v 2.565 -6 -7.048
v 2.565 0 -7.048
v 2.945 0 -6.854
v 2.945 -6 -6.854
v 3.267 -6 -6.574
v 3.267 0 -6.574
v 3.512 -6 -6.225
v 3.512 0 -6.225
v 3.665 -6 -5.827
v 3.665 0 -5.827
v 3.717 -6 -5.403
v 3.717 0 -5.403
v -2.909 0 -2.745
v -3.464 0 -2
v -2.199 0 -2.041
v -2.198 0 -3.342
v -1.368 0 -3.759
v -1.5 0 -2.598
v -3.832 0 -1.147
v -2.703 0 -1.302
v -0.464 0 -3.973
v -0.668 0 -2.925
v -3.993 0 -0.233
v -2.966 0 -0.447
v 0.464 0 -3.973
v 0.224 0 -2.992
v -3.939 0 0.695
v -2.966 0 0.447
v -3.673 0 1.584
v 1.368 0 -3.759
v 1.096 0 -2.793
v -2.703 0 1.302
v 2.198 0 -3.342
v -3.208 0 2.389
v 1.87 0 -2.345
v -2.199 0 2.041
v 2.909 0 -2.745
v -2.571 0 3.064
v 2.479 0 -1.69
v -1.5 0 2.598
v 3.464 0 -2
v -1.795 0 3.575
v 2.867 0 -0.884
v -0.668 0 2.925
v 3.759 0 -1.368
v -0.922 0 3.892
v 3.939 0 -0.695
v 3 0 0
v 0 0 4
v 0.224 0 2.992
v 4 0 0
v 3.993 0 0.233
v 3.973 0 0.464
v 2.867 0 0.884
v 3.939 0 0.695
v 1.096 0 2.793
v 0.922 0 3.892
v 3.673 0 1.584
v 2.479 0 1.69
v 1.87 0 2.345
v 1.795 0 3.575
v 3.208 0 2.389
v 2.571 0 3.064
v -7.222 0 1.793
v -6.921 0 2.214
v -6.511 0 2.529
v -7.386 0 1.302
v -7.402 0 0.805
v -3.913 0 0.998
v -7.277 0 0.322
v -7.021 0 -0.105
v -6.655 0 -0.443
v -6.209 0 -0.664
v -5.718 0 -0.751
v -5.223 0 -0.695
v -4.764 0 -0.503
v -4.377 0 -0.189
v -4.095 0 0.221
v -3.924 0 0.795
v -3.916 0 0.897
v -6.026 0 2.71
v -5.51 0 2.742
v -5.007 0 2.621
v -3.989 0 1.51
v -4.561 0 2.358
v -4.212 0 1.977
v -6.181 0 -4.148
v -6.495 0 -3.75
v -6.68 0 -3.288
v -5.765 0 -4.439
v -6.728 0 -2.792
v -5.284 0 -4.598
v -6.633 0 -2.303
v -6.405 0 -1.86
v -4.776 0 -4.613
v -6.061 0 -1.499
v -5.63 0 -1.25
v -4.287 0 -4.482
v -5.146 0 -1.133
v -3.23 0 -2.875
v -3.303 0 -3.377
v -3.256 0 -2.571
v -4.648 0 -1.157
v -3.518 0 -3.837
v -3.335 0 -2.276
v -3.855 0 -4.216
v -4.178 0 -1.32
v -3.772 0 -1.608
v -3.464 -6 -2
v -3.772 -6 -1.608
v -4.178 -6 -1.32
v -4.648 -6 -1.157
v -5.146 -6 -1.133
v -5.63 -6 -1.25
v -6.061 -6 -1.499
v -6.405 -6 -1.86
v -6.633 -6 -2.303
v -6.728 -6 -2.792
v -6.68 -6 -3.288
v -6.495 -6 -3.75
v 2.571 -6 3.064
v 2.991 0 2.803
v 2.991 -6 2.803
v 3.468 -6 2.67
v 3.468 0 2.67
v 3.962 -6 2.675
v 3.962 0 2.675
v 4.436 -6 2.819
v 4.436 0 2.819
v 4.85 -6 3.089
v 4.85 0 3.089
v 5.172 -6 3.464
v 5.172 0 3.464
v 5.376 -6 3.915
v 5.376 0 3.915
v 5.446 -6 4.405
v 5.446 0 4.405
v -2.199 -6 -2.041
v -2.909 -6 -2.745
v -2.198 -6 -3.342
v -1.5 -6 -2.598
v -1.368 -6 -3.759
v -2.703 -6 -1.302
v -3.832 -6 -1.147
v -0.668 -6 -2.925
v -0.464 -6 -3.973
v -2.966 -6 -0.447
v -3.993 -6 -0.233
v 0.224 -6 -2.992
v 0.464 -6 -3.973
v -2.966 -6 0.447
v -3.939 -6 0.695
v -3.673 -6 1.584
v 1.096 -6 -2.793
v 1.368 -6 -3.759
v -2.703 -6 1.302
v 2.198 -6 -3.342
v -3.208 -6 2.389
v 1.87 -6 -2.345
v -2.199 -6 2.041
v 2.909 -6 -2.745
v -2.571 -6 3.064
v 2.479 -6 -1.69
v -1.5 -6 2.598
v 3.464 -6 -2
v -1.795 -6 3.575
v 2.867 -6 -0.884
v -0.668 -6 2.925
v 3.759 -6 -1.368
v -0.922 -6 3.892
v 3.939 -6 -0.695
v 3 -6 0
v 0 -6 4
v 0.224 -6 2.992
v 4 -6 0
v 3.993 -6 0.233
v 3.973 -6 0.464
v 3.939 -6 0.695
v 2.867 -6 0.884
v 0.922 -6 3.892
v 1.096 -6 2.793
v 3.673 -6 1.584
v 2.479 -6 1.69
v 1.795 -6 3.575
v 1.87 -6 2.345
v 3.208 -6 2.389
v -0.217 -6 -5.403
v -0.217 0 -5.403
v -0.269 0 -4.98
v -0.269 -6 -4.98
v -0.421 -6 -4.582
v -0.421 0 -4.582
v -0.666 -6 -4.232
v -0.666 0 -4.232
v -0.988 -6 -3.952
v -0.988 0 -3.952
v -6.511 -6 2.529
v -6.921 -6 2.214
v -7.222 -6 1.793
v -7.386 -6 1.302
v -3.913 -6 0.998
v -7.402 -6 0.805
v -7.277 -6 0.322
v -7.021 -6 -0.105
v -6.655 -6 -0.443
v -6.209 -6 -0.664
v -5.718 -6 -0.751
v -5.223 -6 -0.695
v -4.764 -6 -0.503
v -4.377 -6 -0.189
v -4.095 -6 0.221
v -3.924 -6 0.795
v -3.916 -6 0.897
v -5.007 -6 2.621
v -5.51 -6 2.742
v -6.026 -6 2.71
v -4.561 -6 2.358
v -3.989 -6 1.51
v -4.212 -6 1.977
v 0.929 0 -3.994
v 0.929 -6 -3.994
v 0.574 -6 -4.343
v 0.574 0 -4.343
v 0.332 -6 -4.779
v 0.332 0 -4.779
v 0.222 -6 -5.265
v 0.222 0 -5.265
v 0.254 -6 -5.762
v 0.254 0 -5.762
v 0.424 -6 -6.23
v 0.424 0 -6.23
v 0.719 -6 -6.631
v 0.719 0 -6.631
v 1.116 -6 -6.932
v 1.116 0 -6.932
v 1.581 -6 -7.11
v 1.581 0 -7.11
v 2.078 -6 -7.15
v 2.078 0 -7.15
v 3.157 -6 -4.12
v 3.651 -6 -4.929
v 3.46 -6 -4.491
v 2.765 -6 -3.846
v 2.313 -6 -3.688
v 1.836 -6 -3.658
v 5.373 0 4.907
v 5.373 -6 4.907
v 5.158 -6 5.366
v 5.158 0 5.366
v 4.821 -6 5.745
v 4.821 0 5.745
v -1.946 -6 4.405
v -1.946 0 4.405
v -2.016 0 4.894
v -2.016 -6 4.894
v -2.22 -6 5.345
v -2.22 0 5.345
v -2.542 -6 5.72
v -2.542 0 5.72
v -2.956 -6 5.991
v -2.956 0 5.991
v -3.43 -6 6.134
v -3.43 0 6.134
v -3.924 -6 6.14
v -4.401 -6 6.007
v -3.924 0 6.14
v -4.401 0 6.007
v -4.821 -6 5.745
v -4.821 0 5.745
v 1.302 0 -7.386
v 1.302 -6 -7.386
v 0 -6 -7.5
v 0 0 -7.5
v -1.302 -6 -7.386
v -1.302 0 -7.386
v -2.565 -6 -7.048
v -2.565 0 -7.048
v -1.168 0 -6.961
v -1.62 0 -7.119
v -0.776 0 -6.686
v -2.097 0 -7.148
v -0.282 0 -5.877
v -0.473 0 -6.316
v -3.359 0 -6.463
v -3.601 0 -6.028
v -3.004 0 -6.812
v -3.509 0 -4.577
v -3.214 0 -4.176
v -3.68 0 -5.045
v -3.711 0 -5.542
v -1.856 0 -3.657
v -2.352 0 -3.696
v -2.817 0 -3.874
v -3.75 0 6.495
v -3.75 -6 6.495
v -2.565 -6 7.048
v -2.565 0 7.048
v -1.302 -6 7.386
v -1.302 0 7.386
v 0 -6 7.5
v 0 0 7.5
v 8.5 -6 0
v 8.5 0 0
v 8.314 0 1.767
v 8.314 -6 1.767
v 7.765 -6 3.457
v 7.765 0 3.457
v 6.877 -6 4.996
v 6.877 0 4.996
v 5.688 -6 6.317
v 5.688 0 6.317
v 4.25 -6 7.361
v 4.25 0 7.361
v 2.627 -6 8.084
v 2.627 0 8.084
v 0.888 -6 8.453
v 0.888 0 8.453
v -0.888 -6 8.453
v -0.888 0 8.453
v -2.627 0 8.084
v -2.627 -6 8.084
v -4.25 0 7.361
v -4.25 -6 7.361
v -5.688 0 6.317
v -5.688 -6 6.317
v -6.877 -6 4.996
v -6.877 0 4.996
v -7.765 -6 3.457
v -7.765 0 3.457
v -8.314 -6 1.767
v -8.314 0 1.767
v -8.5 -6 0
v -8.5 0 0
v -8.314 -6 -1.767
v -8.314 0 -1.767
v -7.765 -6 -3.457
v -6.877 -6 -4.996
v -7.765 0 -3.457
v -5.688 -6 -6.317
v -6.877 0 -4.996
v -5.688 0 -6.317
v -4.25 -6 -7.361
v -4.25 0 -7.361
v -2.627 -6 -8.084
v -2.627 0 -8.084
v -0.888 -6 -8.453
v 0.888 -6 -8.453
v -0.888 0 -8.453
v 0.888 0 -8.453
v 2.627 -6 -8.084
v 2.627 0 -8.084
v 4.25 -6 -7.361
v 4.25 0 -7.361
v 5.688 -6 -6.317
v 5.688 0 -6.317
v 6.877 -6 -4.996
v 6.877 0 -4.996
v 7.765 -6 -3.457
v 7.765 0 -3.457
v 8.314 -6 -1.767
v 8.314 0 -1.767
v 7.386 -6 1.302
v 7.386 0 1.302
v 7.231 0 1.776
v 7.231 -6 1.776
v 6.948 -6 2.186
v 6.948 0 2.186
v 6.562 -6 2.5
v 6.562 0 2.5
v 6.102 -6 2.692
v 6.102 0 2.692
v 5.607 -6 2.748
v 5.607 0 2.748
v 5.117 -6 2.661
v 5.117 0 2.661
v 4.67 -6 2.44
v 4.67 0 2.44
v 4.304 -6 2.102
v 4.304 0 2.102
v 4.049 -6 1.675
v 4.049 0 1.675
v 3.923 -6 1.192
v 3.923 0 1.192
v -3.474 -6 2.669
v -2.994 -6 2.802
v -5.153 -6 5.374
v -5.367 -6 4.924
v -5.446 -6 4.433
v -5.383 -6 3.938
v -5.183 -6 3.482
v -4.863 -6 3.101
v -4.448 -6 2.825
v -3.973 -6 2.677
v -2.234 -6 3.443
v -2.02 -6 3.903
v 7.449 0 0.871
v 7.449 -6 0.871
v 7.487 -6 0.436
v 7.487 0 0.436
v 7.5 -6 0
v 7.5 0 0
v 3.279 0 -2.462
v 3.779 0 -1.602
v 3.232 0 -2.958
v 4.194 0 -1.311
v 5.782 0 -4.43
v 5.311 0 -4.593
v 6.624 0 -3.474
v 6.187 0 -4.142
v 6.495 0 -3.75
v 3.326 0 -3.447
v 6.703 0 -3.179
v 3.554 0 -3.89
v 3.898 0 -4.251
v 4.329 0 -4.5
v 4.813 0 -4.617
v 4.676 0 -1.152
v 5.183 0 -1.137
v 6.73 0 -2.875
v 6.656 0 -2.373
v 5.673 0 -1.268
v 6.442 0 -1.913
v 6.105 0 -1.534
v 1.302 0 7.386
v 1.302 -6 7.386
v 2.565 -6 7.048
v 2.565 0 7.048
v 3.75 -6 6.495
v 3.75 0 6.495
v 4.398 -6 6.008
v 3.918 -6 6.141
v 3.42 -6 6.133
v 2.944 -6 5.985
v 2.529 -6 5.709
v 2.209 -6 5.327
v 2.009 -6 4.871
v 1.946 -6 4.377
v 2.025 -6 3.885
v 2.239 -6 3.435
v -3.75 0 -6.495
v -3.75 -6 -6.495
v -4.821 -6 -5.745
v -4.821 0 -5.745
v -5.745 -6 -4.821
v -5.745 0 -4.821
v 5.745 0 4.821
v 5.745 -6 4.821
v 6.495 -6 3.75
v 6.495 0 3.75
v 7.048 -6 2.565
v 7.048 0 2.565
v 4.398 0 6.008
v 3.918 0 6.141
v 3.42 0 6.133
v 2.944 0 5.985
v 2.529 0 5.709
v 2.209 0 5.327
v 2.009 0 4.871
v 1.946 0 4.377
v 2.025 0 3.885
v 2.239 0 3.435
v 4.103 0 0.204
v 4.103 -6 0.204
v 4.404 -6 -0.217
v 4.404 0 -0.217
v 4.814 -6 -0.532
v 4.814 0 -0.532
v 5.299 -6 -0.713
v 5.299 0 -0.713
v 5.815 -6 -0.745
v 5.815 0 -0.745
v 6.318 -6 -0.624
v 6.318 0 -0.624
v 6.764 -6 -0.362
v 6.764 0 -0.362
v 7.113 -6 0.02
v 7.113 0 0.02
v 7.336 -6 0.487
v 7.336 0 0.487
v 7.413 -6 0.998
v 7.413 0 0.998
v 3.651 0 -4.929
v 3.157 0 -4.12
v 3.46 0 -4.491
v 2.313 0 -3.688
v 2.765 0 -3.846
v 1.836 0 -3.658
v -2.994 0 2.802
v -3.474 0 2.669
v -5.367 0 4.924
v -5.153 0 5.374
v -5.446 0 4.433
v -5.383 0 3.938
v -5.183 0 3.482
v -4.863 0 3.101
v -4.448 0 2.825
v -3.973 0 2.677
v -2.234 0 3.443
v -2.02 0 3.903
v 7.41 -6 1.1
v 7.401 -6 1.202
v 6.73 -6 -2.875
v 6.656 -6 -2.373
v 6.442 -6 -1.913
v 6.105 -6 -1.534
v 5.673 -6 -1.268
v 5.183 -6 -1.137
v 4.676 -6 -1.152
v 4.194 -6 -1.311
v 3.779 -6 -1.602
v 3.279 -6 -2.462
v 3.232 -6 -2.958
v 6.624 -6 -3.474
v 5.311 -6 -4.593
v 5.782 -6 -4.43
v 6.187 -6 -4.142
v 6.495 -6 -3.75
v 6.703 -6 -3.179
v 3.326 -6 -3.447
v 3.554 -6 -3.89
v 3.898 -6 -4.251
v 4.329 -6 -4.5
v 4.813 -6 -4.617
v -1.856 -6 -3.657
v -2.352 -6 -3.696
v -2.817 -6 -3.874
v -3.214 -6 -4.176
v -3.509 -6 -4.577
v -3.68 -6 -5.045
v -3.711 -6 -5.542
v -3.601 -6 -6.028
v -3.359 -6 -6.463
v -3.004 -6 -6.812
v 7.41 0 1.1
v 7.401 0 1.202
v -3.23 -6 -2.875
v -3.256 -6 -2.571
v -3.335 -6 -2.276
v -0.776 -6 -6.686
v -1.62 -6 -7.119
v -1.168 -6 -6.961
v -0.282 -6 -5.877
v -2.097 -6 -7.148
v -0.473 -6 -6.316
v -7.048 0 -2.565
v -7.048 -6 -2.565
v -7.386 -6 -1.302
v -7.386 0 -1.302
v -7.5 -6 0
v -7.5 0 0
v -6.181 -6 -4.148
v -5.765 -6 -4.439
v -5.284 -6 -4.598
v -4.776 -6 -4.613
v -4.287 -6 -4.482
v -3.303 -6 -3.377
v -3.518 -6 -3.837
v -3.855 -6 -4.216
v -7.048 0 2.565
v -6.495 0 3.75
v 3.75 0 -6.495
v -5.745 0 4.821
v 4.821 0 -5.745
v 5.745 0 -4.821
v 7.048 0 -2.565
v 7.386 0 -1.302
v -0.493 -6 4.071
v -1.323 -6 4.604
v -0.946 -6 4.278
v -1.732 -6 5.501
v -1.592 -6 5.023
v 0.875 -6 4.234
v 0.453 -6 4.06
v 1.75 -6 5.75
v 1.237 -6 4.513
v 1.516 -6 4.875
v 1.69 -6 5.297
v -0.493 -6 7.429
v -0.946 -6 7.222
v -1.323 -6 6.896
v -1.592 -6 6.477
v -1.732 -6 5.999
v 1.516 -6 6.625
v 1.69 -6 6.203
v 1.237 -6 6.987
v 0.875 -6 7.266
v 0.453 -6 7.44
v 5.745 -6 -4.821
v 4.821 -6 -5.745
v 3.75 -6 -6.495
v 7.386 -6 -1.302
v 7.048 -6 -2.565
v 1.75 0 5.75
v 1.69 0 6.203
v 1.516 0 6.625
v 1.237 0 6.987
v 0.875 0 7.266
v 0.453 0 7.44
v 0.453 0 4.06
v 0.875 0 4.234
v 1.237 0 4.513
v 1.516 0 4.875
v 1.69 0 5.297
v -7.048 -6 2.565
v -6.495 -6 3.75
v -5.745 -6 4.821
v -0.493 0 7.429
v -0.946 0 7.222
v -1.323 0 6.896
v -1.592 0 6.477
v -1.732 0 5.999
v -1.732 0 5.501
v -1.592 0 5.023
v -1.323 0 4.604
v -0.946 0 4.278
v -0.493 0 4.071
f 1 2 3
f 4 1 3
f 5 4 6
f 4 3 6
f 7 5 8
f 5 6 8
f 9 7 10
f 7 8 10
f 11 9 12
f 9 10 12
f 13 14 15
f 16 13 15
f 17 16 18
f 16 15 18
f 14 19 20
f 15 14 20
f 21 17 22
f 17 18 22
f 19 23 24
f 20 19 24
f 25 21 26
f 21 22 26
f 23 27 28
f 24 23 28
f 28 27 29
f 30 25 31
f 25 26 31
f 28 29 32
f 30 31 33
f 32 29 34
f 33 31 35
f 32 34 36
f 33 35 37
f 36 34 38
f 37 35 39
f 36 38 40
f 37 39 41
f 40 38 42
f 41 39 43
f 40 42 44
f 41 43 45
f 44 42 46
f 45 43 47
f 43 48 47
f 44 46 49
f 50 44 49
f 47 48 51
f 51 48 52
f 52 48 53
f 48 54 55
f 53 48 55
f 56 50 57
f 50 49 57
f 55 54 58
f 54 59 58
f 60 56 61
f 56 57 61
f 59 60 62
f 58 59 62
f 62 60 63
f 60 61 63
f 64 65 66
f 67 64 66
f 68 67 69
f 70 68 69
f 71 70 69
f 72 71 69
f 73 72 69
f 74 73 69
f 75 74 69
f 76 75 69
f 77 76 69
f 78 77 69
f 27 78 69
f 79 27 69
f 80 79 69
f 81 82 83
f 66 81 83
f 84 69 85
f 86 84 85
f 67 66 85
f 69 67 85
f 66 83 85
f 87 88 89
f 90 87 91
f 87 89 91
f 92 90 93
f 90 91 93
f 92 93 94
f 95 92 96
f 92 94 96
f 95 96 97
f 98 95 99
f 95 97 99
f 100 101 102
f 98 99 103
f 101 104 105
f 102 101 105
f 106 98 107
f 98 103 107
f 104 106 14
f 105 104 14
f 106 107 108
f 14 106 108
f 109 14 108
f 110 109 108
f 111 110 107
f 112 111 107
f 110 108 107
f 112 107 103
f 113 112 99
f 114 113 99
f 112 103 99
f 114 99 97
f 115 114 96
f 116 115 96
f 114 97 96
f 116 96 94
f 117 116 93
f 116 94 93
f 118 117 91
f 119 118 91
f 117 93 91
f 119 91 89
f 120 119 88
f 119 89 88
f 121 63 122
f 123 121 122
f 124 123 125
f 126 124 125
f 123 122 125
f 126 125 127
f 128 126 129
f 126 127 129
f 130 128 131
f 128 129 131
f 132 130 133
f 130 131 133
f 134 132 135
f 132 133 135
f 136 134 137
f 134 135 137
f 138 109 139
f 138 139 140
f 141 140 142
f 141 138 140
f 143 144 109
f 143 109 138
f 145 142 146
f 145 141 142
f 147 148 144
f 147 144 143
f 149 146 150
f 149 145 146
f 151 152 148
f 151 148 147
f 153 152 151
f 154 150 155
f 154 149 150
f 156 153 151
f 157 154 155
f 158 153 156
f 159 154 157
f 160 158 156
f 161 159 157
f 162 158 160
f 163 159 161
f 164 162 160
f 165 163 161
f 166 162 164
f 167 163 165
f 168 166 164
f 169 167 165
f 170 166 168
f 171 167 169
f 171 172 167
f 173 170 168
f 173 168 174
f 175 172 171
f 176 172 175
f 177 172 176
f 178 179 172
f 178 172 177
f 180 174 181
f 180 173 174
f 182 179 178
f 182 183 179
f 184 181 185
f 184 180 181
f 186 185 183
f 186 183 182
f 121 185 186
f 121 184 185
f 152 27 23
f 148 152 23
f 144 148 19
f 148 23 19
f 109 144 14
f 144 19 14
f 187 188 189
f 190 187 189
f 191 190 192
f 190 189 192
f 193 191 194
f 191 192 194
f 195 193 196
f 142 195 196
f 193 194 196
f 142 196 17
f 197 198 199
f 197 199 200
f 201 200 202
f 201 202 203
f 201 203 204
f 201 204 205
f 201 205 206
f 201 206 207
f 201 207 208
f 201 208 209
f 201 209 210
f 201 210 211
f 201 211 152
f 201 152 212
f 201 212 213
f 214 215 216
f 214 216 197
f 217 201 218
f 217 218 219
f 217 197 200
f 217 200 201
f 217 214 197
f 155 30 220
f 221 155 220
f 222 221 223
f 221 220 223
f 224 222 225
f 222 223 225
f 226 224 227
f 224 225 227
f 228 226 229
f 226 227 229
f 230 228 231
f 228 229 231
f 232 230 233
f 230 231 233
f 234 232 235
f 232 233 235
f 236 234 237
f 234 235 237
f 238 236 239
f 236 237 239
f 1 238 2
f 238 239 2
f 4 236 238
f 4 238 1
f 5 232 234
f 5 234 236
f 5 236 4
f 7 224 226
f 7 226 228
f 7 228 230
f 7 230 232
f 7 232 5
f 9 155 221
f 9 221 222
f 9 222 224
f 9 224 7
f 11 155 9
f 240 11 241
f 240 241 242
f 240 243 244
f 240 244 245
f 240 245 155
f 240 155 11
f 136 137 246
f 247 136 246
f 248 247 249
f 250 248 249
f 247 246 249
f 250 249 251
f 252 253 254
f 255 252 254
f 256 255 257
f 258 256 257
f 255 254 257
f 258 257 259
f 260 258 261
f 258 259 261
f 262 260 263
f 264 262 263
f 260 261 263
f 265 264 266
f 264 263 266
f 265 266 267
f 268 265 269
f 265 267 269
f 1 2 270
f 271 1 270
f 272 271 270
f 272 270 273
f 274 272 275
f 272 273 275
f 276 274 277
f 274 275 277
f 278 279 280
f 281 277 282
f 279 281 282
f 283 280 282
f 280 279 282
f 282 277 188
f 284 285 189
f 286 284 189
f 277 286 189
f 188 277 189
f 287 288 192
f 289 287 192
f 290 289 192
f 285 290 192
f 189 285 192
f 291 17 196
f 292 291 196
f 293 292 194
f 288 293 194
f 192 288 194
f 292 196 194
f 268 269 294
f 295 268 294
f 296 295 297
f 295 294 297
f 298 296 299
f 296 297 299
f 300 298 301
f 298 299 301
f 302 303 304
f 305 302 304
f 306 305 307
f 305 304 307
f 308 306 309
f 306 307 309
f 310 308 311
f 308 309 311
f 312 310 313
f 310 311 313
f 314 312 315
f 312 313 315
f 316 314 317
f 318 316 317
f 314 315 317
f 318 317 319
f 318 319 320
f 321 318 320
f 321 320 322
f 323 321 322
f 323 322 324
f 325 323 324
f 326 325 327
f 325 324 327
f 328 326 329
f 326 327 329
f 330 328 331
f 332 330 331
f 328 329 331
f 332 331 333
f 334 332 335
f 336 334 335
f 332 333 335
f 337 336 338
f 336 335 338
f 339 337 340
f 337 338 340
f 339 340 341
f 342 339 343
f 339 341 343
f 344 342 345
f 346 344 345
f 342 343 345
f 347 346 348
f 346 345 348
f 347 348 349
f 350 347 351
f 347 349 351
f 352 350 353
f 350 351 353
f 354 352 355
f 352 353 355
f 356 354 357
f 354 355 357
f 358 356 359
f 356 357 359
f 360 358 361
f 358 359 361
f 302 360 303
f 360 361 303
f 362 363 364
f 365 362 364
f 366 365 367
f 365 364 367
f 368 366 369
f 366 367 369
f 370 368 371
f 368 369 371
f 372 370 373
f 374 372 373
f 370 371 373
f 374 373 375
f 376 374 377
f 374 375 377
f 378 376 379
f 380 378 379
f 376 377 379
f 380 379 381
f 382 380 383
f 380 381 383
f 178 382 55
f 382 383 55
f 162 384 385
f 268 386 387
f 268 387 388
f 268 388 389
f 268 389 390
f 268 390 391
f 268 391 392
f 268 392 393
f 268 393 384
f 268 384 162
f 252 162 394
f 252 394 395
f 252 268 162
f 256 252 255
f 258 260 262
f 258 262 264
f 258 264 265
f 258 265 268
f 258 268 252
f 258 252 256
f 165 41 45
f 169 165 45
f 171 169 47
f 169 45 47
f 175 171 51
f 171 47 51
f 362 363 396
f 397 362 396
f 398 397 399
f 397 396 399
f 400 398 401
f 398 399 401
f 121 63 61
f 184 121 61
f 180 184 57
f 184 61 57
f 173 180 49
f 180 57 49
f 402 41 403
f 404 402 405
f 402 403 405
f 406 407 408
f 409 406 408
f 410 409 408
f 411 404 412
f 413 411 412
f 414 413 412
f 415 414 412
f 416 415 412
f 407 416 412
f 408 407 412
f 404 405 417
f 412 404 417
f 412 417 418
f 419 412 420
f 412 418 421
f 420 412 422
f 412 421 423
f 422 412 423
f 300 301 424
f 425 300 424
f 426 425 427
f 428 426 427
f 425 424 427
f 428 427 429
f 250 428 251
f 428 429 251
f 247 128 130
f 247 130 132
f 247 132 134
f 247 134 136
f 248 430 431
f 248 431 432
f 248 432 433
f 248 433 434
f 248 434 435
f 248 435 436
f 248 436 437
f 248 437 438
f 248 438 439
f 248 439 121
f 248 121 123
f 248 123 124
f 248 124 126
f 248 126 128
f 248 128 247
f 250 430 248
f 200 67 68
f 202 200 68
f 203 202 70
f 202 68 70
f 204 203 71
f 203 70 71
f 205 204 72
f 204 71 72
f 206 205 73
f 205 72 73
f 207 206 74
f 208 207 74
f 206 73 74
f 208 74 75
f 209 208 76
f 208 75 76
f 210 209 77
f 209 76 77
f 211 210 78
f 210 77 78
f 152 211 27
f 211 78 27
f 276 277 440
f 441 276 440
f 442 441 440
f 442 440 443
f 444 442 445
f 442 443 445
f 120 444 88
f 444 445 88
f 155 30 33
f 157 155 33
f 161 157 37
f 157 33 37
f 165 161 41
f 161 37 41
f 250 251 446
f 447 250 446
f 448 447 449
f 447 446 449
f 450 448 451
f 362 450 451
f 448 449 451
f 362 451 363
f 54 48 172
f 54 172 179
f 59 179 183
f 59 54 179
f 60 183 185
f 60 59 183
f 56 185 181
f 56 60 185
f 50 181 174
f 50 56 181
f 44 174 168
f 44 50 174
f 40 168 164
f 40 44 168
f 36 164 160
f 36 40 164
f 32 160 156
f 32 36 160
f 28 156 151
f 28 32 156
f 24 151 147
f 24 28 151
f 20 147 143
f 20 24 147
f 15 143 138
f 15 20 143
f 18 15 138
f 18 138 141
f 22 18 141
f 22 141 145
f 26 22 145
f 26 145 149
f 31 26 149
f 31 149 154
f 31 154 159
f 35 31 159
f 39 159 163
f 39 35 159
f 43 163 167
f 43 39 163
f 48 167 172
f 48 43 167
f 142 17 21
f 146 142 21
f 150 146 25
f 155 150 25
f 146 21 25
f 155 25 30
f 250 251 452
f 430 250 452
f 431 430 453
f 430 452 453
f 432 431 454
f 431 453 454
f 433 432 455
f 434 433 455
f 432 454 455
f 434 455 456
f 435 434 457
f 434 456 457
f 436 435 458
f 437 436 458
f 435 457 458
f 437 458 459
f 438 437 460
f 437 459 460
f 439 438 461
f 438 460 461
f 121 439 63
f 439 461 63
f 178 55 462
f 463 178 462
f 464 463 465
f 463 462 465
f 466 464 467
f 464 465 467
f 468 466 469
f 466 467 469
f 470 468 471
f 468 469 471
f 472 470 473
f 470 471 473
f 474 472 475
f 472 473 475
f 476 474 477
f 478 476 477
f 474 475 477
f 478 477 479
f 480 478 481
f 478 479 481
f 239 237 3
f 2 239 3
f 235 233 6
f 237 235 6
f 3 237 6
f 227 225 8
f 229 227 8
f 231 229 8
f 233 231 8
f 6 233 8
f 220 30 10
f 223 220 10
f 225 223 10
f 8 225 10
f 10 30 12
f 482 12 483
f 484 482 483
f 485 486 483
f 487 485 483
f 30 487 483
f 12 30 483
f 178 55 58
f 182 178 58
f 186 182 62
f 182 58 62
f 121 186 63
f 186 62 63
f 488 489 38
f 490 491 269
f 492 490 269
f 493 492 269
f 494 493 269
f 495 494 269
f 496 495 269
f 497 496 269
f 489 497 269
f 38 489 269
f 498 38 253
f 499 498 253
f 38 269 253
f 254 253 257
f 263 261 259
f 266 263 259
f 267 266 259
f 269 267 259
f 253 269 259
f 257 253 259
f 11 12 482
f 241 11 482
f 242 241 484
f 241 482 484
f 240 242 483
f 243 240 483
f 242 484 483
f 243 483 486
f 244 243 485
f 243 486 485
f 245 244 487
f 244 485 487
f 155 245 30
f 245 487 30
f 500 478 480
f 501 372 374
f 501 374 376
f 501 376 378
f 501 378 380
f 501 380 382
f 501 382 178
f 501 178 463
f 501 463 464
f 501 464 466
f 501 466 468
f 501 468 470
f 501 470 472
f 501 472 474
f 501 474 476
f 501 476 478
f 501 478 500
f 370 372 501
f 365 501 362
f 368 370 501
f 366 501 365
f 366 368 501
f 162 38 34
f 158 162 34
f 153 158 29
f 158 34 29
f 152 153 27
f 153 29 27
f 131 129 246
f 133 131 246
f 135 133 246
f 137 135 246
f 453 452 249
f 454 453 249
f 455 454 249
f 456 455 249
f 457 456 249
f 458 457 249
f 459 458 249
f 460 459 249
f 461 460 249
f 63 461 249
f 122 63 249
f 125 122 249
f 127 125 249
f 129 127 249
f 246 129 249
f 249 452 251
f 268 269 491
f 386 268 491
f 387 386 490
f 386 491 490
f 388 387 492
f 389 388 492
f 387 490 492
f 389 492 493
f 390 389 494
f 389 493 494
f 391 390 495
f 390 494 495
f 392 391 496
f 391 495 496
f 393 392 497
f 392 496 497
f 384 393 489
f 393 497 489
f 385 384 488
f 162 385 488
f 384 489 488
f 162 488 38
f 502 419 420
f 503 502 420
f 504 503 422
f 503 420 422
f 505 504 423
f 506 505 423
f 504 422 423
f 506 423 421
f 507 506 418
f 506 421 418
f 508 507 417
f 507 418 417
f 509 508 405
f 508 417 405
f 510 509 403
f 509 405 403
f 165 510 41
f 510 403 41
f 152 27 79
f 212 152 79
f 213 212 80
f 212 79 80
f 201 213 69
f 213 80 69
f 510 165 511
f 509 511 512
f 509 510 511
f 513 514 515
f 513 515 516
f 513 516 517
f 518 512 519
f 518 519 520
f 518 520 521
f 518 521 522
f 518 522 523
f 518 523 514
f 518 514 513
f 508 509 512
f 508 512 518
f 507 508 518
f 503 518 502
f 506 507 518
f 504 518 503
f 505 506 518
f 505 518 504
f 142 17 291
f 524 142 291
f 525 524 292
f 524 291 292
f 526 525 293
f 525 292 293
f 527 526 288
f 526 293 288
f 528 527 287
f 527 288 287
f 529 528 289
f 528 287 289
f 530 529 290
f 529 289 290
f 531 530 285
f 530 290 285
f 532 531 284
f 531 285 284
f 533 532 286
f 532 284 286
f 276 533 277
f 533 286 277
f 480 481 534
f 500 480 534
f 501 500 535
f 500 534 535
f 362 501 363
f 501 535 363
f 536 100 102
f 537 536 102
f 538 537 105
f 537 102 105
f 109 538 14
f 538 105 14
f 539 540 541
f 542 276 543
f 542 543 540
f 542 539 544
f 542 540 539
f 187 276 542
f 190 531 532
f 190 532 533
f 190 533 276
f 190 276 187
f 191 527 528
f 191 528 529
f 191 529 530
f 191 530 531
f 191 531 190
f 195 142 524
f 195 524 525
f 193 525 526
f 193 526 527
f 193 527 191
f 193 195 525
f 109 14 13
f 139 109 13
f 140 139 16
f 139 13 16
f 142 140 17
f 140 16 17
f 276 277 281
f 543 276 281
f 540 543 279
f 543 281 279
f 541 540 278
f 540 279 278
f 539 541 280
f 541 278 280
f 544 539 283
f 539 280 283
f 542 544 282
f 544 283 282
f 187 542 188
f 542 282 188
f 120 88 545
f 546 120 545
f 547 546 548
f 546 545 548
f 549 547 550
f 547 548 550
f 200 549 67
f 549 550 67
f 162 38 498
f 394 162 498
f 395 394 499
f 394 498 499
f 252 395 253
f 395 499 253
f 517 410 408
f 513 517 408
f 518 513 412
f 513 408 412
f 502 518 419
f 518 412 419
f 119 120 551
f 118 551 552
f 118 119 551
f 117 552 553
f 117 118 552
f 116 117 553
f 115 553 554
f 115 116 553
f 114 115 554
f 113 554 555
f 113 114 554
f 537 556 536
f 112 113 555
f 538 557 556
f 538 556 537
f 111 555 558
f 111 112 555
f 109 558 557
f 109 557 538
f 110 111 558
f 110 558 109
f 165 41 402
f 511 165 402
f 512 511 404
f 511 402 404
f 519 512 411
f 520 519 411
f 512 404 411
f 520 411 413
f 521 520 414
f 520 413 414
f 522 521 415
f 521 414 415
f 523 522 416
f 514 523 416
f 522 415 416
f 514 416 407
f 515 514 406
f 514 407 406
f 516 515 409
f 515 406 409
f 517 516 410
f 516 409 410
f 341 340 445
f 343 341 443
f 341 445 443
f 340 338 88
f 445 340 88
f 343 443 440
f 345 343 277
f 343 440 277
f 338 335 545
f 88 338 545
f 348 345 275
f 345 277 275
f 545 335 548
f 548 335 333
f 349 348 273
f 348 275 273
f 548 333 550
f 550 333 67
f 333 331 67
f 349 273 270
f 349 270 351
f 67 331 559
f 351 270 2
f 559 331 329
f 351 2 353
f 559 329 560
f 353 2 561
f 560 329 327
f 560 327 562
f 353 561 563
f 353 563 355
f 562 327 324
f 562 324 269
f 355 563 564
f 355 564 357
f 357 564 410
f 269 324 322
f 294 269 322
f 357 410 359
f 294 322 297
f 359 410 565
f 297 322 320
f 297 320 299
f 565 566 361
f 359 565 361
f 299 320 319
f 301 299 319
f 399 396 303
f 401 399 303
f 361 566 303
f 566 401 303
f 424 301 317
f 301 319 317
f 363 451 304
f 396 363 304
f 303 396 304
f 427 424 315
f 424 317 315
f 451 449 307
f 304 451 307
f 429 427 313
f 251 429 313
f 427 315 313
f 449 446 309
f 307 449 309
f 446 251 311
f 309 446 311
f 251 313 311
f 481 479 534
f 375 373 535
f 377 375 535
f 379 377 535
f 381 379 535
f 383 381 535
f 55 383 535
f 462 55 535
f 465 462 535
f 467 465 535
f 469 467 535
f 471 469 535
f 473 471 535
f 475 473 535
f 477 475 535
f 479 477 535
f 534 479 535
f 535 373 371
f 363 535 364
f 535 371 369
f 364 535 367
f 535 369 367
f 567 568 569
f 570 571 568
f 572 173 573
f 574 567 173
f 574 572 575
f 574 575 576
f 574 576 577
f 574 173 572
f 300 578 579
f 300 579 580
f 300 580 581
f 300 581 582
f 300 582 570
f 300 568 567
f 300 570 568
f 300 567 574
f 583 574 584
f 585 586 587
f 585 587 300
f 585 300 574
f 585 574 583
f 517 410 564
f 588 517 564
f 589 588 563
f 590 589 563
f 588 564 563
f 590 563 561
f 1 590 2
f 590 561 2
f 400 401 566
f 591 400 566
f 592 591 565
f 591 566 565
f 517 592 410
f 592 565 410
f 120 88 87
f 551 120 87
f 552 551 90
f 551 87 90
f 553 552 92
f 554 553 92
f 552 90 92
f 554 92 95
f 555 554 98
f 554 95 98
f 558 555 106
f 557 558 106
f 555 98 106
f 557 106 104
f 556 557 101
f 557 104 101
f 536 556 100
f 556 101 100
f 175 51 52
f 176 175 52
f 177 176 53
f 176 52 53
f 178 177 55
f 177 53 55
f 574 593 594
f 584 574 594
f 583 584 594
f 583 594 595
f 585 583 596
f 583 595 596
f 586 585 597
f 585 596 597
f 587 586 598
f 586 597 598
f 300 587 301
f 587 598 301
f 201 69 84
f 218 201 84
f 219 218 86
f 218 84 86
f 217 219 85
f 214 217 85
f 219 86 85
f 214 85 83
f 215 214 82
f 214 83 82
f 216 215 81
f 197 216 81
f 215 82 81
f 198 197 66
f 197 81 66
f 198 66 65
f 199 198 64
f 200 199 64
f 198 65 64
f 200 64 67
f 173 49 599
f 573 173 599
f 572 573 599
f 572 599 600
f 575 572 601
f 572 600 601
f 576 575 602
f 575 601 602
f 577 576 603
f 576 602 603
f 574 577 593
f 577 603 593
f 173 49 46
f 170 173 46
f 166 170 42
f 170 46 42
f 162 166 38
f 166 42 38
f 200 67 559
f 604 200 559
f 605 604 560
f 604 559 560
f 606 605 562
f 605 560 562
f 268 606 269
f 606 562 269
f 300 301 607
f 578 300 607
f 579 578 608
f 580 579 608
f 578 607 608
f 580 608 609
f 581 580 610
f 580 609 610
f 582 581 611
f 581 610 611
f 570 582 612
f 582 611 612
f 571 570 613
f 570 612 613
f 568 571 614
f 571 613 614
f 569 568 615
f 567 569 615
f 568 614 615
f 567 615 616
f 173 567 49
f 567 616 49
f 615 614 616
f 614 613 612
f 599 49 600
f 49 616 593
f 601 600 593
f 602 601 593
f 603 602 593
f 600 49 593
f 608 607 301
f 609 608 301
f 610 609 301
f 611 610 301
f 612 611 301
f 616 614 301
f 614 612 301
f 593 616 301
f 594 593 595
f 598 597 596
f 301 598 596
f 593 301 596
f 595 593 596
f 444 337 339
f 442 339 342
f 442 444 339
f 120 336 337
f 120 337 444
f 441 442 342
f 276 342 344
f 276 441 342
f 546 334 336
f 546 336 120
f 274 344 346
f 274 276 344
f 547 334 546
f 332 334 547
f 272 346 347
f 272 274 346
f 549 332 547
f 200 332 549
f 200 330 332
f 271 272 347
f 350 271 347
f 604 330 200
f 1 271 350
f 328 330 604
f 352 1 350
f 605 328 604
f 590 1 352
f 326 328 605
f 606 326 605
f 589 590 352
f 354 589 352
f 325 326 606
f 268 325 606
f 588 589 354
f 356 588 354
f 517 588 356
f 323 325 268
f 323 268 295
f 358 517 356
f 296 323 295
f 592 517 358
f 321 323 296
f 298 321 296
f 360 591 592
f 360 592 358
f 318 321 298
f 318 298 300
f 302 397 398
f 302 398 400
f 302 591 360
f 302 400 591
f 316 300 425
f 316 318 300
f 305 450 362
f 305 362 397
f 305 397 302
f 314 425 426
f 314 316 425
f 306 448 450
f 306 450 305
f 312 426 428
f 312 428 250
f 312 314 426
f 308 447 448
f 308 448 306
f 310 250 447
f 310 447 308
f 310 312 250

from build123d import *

# Parameters (mm, degrees)
F0_R     = 8.5
F0_R_2   = 3
F1_DEPTH = 6


with BuildPart() as f1:
    # F0 (on Front) → F1 (new body)
    with BuildSketch(Plane.XZ):
        Circle(F0_R)
        with BuildLine():
            ThreePointArc((7.386058, 1.302361), (7.47146, 0.653668), (7.5, 0))
            ThreePointArc((7.5, 0), (7.244444, -1.941143), (6.495191, -3.75))
            ThreePointArc((6.495191, -3.75), (4.820907, -5.745333), (2.565151, -7.047695))
            ThreePointArc((2.565151, -7.047695), (0, -7.5), (-2.565151, -7.047695))
            ThreePointArc((-2.565151, -7.047695), (-4.820907, -5.745333), (-6.495191, -3.75))
            ThreePointArc((-6.495191, -3.75), (-7.386058, -1.302361), (-7.386058, 1.302361))
            ThreePointArc((-7.386058, 1.302361), (-6.495191, 3.75), (-4.820907, 5.745333))
            ThreePointArc((-4.820907, 5.745333), (-2.565151, 7.047695), (0, 7.5))
            ThreePointArc((0, 7.5), (2.565151, 7.047695), (4.820907, 5.745333))
            ThreePointArc((4.820907, 5.745333), (6.495191, 3.75), (7.386058, 1.302361))
        make_face(mode=Mode.SUBTRACT)
        with BuildLine():
            ThreePointArc((-1.946029, 4.404756), (-2.956447, 5.990794), (-4.820907, 5.745333))
            ThreePointArc((-4.820907, 5.745333), (-5.036607, 3.279877), (-2.57115, 3.064178))
            ThreePointArc((-2.57115, 3.064178), (-2.10999, 3.665174), (-1.946029, 4.404756))
        make_face()
        with BuildLine():
            ThreePointArc((-3.912645, 0.998477), (-5.510122, 2.741818), (-7.386058, 1.302361))
            ThreePointArc((-7.386058, 1.302361), (-5.966529, -0.724937), (-3.939231, 0.694593))
            ThreePointArc((-3.939231, 0.694593), (-3.919304, 0.845954), (-3.912645, 0.998477))
        make_face()
        with BuildLine():
            ThreePointArc((-3.464102, -2), (-5.854646, -1.359456), (-6.495191, -3.75))
            ThreePointArc((-6.495191, -3.75), (-4.526713, -4.56537), (-3.229646, -2.875))
            ThreePointArc((-3.229646, -2.875), (-3.289276, -2.422067), (-3.464102, -2))
        make_face()
        with BuildLine():
            ThreePointArc((4, 0), (3.984779, 0.348623), (3.939231, 0.694593))
            ThreePointArc((3.939231, 0.694593), (3.464102, 2), (2.57115, 3.064178))
            ThreePointArc((2.57115, 3.064178), (1.368081, 3.75877), (0, 4))
            ThreePointArc((0, 4), (-1.368081, 3.75877), (-2.57115, 3.064178))
            ThreePointArc((-2.57115, 3.064178), (-3.464102, 2), (-3.939231, 0.694593))
            ThreePointArc((-3.939231, 0.694593), (-3.939231, -0.694593), (-3.464102, -2))
            ThreePointArc((-3.464102, -2), (-2.57115, -3.064178), (-1.368081, -3.75877))
            ThreePointArc((-1.368081, -3.75877), (0, -4), (1.368081, -3.75877))
            ThreePointArc((1.368081, -3.75877), (2.57115, -3.064178), (3.464102, -2))
            ThreePointArc((3.464102, -2), (3.863703, -1.035276), (4, 0))
        make_face()
        Circle(F0_R_2, mode=Mode.SUBTRACT)
        with BuildLine():
            ThreePointArc((1.75, 5.75), (1.237437, 6.987437), (0, 7.5))
            ThreePointArc((0, 7.5), (-1.75, 5.75), (0, 4))
            ThreePointArc((0, 4), (1.237437, 4.512563), (1.75, 5.75))
        make_face()
        with BuildLine():
            ThreePointArc((5.446029, 4.404756), (5.282067, 5.144337), (4.820907, 5.745333))
            ThreePointArc((4.820907, 5.745333), (2.355451, 5.529634), (2.57115, 3.064178))
            ThreePointArc((2.57115, 3.064178), (4.435611, 2.818717), (5.446029, 4.404756))
        make_face()
        with BuildLine():
            ThreePointArc((7.412645, 0.998477), (7.405985, 1.151), (7.386058, 1.302361))
            ThreePointArc((7.386058, 1.302361), (5.35876, 2.721891), (3.939231, 0.694593))
            ThreePointArc((3.939231, 0.694593), (5.815167, -0.744864), (7.412645, 0.998477))
        make_face()
        with BuildLine():
            ThreePointArc((3.464102, -2), (4.104646, -4.390544), (6.495191, -3.75))
            ThreePointArc((6.495191, -3.75), (6.670016, -3.327933), (6.729646, -2.875))
            ThreePointArc((6.729646, -2.875), (5.432579, -1.18463), (3.464102, -2))
        make_face()
        with BuildLine():
            ThreePointArc((1.368081, -3.75877), (0.322154, -6.001768), (2.565151, -7.047695))
            ThreePointArc((2.565151, -7.047695), (3.400132, -6.406991), (3.716616, -5.403233))
            ThreePointArc((3.716616, -5.403233), (2.970375, -3.969716), (1.368081, -3.75877))
        make_face()
        with BuildLine():
            ThreePointArc((-1.368081, -3.75877), (-3.611078, -4.804697), (-2.565151, -7.047695))
            ThreePointArc((-2.565151, -7.047695), (-0.962857, -6.836749), (-0.216616, -5.403233))
            ThreePointArc((-0.216616, -5.403233), (-0.5331, -4.399474), (-1.368081, -3.75877))
        make_face()
    extrude(amount=F1_DEPTH)


solid = f1.part
